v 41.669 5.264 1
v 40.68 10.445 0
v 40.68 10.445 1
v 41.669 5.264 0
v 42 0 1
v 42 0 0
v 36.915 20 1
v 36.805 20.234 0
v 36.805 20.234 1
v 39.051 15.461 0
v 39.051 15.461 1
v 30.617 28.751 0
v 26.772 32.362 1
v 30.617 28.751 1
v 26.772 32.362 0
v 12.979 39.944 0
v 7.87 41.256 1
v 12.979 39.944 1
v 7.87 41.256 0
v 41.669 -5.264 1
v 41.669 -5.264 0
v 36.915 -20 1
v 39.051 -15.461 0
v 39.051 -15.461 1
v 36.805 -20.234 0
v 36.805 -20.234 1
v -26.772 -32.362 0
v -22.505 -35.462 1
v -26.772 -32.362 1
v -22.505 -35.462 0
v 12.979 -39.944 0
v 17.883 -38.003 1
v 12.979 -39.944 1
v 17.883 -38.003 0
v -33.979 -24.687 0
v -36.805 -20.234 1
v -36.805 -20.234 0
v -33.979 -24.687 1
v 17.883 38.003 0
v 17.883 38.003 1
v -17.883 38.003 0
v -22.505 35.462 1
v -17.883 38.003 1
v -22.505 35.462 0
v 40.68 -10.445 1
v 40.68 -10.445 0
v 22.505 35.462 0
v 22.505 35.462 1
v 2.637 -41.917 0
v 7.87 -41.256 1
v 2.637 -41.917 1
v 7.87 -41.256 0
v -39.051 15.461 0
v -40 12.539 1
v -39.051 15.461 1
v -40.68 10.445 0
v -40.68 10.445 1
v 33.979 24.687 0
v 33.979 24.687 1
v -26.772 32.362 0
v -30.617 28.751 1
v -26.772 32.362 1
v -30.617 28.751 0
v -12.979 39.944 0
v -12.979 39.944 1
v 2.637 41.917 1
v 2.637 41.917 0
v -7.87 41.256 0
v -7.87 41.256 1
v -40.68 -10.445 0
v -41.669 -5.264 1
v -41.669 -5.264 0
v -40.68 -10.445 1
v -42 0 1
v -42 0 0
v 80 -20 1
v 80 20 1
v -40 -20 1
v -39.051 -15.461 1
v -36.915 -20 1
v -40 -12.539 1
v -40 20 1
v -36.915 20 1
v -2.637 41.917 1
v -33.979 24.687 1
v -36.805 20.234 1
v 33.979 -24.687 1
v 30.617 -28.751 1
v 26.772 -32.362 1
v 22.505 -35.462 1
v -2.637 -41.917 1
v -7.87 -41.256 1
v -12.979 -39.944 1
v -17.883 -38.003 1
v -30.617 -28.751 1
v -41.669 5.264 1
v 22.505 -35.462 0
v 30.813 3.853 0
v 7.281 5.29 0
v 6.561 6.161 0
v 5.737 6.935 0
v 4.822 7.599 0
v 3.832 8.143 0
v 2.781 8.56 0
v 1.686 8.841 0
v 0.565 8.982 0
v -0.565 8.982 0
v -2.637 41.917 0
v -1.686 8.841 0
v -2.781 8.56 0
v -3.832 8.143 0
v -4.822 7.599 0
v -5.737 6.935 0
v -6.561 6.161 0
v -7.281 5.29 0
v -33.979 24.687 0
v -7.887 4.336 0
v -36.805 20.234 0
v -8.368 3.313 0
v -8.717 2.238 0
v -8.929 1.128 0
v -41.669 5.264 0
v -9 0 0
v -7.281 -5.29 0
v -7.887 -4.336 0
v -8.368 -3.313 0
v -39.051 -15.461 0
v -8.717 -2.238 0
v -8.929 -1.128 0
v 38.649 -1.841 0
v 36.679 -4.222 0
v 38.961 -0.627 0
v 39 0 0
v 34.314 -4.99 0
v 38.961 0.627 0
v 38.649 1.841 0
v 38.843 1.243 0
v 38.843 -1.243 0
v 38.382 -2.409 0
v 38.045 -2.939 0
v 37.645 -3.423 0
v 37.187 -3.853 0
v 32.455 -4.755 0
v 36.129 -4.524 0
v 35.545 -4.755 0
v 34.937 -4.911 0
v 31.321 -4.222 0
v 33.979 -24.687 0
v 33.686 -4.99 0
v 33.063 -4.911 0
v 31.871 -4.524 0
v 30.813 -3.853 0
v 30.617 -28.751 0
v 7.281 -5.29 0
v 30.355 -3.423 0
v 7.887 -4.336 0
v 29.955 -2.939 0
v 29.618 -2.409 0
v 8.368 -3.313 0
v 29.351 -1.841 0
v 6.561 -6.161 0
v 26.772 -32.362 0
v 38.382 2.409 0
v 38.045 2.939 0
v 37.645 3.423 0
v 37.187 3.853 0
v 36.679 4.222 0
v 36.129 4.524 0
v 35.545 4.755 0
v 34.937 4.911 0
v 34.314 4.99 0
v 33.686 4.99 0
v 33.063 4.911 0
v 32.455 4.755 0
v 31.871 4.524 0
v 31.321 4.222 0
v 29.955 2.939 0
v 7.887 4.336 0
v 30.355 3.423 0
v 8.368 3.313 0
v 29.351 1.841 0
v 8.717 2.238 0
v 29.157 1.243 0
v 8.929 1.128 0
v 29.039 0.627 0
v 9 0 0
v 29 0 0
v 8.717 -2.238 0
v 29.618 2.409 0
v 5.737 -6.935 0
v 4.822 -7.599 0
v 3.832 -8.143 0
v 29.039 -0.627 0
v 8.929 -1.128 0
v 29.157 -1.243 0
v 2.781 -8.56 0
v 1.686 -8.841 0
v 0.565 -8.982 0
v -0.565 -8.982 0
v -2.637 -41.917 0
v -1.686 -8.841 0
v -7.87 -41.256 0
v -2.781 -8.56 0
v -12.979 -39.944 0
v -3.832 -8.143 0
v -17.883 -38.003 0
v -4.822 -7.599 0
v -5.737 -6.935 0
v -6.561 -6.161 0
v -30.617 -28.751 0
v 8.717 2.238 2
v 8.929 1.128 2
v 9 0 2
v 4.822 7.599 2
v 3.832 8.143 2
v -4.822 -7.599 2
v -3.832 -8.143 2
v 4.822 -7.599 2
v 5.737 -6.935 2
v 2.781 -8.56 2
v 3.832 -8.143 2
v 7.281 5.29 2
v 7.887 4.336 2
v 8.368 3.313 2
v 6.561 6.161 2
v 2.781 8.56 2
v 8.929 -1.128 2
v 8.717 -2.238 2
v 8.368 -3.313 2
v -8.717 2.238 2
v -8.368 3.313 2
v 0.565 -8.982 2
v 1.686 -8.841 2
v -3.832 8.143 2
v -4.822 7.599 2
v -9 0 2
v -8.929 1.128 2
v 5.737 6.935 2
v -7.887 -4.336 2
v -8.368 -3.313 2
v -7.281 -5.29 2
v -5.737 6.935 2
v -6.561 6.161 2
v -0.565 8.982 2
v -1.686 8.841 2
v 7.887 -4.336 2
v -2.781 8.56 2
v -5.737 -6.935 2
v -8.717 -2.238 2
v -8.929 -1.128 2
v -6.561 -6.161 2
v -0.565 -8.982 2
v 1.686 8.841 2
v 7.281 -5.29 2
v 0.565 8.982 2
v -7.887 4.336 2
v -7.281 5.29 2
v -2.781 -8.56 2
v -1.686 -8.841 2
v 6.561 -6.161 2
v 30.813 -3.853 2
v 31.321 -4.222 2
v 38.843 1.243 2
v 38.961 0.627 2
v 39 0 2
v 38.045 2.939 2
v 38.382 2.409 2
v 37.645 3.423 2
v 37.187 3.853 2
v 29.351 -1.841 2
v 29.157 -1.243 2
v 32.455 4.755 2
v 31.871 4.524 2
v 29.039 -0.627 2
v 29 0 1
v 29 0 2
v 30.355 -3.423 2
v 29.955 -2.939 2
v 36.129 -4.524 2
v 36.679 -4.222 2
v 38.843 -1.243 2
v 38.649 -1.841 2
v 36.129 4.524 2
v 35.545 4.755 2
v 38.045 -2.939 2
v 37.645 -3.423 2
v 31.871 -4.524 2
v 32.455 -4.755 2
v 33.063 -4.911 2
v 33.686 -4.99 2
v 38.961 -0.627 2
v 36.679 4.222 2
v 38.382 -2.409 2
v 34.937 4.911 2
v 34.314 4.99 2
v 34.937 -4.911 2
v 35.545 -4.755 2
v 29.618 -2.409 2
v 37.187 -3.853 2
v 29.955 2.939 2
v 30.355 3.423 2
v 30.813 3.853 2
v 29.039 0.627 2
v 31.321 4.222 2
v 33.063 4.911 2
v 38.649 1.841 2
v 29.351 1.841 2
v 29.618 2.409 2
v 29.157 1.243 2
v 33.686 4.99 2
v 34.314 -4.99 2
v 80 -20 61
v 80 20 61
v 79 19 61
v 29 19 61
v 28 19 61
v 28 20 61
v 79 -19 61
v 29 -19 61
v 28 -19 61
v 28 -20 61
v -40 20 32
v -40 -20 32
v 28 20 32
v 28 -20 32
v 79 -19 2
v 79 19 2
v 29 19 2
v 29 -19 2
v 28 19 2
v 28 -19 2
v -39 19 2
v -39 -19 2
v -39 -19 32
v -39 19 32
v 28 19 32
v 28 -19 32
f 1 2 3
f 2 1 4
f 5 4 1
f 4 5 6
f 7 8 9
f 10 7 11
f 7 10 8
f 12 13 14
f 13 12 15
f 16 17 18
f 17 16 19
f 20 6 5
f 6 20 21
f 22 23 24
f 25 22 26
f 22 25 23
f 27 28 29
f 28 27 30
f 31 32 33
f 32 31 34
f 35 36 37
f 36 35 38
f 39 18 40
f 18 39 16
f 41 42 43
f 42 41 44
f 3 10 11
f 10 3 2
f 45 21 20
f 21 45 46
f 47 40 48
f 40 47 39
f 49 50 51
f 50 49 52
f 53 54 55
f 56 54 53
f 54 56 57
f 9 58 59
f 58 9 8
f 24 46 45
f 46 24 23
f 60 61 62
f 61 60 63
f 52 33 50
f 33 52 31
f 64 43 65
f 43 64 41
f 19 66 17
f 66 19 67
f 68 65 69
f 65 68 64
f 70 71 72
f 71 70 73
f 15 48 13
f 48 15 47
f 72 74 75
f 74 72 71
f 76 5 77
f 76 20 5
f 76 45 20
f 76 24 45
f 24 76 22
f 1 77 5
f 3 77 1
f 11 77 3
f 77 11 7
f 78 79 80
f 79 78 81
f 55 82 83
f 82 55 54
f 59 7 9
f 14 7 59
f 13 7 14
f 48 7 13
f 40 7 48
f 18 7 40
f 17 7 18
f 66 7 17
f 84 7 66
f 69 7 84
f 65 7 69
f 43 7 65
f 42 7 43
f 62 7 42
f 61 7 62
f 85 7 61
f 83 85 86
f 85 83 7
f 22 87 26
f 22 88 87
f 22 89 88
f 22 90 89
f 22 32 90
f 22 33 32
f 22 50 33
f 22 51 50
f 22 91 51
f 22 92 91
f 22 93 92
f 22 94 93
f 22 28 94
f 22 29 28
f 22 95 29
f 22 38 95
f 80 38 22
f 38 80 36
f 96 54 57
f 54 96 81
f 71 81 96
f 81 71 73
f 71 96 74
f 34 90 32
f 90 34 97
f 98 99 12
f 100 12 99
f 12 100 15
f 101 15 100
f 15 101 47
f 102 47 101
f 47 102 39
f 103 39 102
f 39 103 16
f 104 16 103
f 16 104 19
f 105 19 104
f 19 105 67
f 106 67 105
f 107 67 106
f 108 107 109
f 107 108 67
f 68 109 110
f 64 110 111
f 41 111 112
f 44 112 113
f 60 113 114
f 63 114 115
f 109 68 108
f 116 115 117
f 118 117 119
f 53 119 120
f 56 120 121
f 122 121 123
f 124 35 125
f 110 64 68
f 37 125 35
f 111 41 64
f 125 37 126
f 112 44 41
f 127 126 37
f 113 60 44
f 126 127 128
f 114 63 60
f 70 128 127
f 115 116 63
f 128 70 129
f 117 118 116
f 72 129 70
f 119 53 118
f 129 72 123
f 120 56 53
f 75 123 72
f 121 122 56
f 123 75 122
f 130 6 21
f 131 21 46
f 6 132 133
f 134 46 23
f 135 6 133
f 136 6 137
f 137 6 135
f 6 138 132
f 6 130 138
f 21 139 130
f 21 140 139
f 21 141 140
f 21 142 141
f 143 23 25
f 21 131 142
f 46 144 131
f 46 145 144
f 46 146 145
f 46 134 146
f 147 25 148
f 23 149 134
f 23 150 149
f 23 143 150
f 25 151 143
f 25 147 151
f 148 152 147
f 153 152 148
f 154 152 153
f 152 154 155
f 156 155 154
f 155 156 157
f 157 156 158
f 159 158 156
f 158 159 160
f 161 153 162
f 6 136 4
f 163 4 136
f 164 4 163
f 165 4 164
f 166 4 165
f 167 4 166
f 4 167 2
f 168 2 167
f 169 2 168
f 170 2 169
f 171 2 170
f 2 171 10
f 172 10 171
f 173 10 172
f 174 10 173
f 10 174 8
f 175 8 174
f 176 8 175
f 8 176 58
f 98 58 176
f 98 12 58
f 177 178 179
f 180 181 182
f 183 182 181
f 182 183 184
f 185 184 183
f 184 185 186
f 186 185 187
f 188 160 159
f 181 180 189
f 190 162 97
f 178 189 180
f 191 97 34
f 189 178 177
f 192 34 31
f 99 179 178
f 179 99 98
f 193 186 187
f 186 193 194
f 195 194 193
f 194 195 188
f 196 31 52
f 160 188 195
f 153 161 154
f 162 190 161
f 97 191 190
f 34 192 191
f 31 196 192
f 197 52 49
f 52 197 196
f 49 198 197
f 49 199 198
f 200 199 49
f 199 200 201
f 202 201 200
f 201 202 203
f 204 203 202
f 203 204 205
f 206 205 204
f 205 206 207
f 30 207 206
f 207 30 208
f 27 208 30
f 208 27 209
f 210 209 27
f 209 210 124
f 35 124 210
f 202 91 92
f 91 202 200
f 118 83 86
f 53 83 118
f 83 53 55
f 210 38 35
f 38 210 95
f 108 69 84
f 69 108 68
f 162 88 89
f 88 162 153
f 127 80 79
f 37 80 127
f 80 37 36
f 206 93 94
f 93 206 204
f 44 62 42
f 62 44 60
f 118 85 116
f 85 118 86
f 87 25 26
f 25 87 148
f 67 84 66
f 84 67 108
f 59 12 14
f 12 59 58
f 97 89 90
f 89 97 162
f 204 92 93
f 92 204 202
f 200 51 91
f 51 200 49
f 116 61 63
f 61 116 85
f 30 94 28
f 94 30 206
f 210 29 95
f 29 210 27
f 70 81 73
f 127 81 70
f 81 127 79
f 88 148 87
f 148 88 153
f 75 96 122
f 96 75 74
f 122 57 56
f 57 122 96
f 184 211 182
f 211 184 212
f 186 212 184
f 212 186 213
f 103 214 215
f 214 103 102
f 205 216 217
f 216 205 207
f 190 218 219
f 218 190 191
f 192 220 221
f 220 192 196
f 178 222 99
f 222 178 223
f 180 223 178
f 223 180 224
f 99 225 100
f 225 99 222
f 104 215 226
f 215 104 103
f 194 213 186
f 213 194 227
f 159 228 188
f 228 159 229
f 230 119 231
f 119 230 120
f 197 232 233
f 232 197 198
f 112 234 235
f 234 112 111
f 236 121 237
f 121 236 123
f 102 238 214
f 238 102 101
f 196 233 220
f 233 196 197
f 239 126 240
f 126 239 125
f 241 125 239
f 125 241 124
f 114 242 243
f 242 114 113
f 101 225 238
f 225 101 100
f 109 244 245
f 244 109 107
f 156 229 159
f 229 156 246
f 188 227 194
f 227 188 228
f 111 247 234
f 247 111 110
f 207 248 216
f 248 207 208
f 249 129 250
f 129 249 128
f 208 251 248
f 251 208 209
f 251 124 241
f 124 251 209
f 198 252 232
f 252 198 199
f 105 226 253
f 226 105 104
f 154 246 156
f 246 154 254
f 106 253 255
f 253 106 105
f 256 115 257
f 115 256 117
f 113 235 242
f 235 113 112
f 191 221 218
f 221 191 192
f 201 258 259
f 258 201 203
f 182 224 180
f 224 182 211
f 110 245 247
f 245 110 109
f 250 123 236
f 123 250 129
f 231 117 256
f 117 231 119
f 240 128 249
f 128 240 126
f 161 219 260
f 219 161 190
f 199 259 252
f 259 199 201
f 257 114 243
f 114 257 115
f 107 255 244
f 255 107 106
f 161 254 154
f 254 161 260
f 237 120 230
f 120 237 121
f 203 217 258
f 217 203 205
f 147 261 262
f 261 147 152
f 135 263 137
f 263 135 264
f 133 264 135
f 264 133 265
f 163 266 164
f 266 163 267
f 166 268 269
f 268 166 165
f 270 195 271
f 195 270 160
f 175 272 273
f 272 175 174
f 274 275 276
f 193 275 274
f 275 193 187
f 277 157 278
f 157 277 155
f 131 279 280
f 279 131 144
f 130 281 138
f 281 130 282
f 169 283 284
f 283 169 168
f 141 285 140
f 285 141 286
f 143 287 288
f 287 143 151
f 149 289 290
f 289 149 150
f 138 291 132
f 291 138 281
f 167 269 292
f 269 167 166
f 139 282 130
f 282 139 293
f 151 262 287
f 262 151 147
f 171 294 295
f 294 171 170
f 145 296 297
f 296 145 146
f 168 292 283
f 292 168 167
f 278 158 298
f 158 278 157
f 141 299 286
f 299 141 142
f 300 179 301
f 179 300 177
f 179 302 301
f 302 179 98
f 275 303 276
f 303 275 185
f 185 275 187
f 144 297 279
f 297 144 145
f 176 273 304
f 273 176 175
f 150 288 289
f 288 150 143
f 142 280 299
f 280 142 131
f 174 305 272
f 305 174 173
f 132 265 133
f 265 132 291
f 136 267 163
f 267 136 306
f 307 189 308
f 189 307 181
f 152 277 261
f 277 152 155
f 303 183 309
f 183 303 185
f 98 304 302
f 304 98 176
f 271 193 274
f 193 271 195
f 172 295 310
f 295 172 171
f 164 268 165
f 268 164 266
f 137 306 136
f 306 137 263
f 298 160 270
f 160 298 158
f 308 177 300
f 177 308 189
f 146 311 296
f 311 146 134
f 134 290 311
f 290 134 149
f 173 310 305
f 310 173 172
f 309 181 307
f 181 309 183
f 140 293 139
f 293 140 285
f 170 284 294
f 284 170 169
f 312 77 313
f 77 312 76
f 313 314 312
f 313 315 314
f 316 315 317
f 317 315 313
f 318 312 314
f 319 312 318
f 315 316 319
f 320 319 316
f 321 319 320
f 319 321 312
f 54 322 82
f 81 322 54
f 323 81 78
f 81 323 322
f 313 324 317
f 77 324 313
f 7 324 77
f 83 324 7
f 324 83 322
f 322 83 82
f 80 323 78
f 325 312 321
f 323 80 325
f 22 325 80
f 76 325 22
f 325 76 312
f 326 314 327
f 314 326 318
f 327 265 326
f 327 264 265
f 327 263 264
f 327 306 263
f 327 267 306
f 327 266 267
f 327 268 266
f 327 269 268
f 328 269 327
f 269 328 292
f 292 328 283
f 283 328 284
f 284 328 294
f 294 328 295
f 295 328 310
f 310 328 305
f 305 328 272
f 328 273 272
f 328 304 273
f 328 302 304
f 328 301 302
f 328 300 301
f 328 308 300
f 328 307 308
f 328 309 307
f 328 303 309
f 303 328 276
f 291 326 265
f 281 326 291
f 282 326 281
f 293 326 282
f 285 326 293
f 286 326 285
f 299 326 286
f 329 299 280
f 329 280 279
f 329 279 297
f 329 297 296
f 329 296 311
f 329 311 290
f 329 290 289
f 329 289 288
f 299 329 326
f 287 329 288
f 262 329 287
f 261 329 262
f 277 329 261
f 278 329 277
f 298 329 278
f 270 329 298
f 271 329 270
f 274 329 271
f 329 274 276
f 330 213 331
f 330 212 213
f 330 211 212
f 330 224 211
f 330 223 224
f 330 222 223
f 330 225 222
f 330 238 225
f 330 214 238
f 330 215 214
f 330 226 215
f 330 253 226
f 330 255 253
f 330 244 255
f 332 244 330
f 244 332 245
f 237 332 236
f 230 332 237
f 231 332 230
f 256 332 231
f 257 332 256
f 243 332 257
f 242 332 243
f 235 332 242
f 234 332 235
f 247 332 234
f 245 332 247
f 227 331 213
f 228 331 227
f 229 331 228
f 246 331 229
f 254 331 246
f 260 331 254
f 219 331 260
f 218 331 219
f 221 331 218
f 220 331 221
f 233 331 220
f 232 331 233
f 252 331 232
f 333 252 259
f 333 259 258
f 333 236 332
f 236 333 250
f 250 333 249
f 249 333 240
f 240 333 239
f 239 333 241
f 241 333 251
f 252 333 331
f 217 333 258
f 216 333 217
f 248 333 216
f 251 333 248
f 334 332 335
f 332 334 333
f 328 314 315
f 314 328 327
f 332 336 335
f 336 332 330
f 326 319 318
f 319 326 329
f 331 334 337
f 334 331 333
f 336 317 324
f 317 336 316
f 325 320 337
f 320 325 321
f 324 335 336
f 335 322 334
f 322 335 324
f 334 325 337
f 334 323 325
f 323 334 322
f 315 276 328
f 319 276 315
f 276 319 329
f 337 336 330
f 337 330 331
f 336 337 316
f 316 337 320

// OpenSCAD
print_bottom = true;
print_top = true;

r = 40;
s = 1;
h = 60;


$fn = 50;

feeder_hole_r = 5;
center_hole_r = 9;
servo_case_height = 30;

if(print_bottom) {
    difference() {
        cylinder(s,r+2*s,r+2*s);

        cylinder(s,center_hole_r,center_hole_r);
        translate([r-feeder_hole_r-s,0,0]) cylinder(s,feeder_hole_r,feeder_hole_r);

    }
}
if(print_top) {
    difference() {
        translate([-r,-r/2,s]) cube([r*3,r,h]);
        translate([-r+s,-r/2+s,2*s]) cube([r*3-2*s,r-2*s,h]);
        translate([-r,-r/2,2*s+servo_case_height]) cube([r*2-2*s-feeder_hole_r*2,r,h]);

        translate([0,0,s])cylinder(s,center_hole_r,center_hole_r);
        translate([r-feeder_hole_r-s,0,s]) cylinder(s,feeder_hole_r,feeder_hole_r);


    }


translate([r-feeder_hole_r*2-2*s,-r/2+s,s])cube([s,r-2*s,h]);
}
